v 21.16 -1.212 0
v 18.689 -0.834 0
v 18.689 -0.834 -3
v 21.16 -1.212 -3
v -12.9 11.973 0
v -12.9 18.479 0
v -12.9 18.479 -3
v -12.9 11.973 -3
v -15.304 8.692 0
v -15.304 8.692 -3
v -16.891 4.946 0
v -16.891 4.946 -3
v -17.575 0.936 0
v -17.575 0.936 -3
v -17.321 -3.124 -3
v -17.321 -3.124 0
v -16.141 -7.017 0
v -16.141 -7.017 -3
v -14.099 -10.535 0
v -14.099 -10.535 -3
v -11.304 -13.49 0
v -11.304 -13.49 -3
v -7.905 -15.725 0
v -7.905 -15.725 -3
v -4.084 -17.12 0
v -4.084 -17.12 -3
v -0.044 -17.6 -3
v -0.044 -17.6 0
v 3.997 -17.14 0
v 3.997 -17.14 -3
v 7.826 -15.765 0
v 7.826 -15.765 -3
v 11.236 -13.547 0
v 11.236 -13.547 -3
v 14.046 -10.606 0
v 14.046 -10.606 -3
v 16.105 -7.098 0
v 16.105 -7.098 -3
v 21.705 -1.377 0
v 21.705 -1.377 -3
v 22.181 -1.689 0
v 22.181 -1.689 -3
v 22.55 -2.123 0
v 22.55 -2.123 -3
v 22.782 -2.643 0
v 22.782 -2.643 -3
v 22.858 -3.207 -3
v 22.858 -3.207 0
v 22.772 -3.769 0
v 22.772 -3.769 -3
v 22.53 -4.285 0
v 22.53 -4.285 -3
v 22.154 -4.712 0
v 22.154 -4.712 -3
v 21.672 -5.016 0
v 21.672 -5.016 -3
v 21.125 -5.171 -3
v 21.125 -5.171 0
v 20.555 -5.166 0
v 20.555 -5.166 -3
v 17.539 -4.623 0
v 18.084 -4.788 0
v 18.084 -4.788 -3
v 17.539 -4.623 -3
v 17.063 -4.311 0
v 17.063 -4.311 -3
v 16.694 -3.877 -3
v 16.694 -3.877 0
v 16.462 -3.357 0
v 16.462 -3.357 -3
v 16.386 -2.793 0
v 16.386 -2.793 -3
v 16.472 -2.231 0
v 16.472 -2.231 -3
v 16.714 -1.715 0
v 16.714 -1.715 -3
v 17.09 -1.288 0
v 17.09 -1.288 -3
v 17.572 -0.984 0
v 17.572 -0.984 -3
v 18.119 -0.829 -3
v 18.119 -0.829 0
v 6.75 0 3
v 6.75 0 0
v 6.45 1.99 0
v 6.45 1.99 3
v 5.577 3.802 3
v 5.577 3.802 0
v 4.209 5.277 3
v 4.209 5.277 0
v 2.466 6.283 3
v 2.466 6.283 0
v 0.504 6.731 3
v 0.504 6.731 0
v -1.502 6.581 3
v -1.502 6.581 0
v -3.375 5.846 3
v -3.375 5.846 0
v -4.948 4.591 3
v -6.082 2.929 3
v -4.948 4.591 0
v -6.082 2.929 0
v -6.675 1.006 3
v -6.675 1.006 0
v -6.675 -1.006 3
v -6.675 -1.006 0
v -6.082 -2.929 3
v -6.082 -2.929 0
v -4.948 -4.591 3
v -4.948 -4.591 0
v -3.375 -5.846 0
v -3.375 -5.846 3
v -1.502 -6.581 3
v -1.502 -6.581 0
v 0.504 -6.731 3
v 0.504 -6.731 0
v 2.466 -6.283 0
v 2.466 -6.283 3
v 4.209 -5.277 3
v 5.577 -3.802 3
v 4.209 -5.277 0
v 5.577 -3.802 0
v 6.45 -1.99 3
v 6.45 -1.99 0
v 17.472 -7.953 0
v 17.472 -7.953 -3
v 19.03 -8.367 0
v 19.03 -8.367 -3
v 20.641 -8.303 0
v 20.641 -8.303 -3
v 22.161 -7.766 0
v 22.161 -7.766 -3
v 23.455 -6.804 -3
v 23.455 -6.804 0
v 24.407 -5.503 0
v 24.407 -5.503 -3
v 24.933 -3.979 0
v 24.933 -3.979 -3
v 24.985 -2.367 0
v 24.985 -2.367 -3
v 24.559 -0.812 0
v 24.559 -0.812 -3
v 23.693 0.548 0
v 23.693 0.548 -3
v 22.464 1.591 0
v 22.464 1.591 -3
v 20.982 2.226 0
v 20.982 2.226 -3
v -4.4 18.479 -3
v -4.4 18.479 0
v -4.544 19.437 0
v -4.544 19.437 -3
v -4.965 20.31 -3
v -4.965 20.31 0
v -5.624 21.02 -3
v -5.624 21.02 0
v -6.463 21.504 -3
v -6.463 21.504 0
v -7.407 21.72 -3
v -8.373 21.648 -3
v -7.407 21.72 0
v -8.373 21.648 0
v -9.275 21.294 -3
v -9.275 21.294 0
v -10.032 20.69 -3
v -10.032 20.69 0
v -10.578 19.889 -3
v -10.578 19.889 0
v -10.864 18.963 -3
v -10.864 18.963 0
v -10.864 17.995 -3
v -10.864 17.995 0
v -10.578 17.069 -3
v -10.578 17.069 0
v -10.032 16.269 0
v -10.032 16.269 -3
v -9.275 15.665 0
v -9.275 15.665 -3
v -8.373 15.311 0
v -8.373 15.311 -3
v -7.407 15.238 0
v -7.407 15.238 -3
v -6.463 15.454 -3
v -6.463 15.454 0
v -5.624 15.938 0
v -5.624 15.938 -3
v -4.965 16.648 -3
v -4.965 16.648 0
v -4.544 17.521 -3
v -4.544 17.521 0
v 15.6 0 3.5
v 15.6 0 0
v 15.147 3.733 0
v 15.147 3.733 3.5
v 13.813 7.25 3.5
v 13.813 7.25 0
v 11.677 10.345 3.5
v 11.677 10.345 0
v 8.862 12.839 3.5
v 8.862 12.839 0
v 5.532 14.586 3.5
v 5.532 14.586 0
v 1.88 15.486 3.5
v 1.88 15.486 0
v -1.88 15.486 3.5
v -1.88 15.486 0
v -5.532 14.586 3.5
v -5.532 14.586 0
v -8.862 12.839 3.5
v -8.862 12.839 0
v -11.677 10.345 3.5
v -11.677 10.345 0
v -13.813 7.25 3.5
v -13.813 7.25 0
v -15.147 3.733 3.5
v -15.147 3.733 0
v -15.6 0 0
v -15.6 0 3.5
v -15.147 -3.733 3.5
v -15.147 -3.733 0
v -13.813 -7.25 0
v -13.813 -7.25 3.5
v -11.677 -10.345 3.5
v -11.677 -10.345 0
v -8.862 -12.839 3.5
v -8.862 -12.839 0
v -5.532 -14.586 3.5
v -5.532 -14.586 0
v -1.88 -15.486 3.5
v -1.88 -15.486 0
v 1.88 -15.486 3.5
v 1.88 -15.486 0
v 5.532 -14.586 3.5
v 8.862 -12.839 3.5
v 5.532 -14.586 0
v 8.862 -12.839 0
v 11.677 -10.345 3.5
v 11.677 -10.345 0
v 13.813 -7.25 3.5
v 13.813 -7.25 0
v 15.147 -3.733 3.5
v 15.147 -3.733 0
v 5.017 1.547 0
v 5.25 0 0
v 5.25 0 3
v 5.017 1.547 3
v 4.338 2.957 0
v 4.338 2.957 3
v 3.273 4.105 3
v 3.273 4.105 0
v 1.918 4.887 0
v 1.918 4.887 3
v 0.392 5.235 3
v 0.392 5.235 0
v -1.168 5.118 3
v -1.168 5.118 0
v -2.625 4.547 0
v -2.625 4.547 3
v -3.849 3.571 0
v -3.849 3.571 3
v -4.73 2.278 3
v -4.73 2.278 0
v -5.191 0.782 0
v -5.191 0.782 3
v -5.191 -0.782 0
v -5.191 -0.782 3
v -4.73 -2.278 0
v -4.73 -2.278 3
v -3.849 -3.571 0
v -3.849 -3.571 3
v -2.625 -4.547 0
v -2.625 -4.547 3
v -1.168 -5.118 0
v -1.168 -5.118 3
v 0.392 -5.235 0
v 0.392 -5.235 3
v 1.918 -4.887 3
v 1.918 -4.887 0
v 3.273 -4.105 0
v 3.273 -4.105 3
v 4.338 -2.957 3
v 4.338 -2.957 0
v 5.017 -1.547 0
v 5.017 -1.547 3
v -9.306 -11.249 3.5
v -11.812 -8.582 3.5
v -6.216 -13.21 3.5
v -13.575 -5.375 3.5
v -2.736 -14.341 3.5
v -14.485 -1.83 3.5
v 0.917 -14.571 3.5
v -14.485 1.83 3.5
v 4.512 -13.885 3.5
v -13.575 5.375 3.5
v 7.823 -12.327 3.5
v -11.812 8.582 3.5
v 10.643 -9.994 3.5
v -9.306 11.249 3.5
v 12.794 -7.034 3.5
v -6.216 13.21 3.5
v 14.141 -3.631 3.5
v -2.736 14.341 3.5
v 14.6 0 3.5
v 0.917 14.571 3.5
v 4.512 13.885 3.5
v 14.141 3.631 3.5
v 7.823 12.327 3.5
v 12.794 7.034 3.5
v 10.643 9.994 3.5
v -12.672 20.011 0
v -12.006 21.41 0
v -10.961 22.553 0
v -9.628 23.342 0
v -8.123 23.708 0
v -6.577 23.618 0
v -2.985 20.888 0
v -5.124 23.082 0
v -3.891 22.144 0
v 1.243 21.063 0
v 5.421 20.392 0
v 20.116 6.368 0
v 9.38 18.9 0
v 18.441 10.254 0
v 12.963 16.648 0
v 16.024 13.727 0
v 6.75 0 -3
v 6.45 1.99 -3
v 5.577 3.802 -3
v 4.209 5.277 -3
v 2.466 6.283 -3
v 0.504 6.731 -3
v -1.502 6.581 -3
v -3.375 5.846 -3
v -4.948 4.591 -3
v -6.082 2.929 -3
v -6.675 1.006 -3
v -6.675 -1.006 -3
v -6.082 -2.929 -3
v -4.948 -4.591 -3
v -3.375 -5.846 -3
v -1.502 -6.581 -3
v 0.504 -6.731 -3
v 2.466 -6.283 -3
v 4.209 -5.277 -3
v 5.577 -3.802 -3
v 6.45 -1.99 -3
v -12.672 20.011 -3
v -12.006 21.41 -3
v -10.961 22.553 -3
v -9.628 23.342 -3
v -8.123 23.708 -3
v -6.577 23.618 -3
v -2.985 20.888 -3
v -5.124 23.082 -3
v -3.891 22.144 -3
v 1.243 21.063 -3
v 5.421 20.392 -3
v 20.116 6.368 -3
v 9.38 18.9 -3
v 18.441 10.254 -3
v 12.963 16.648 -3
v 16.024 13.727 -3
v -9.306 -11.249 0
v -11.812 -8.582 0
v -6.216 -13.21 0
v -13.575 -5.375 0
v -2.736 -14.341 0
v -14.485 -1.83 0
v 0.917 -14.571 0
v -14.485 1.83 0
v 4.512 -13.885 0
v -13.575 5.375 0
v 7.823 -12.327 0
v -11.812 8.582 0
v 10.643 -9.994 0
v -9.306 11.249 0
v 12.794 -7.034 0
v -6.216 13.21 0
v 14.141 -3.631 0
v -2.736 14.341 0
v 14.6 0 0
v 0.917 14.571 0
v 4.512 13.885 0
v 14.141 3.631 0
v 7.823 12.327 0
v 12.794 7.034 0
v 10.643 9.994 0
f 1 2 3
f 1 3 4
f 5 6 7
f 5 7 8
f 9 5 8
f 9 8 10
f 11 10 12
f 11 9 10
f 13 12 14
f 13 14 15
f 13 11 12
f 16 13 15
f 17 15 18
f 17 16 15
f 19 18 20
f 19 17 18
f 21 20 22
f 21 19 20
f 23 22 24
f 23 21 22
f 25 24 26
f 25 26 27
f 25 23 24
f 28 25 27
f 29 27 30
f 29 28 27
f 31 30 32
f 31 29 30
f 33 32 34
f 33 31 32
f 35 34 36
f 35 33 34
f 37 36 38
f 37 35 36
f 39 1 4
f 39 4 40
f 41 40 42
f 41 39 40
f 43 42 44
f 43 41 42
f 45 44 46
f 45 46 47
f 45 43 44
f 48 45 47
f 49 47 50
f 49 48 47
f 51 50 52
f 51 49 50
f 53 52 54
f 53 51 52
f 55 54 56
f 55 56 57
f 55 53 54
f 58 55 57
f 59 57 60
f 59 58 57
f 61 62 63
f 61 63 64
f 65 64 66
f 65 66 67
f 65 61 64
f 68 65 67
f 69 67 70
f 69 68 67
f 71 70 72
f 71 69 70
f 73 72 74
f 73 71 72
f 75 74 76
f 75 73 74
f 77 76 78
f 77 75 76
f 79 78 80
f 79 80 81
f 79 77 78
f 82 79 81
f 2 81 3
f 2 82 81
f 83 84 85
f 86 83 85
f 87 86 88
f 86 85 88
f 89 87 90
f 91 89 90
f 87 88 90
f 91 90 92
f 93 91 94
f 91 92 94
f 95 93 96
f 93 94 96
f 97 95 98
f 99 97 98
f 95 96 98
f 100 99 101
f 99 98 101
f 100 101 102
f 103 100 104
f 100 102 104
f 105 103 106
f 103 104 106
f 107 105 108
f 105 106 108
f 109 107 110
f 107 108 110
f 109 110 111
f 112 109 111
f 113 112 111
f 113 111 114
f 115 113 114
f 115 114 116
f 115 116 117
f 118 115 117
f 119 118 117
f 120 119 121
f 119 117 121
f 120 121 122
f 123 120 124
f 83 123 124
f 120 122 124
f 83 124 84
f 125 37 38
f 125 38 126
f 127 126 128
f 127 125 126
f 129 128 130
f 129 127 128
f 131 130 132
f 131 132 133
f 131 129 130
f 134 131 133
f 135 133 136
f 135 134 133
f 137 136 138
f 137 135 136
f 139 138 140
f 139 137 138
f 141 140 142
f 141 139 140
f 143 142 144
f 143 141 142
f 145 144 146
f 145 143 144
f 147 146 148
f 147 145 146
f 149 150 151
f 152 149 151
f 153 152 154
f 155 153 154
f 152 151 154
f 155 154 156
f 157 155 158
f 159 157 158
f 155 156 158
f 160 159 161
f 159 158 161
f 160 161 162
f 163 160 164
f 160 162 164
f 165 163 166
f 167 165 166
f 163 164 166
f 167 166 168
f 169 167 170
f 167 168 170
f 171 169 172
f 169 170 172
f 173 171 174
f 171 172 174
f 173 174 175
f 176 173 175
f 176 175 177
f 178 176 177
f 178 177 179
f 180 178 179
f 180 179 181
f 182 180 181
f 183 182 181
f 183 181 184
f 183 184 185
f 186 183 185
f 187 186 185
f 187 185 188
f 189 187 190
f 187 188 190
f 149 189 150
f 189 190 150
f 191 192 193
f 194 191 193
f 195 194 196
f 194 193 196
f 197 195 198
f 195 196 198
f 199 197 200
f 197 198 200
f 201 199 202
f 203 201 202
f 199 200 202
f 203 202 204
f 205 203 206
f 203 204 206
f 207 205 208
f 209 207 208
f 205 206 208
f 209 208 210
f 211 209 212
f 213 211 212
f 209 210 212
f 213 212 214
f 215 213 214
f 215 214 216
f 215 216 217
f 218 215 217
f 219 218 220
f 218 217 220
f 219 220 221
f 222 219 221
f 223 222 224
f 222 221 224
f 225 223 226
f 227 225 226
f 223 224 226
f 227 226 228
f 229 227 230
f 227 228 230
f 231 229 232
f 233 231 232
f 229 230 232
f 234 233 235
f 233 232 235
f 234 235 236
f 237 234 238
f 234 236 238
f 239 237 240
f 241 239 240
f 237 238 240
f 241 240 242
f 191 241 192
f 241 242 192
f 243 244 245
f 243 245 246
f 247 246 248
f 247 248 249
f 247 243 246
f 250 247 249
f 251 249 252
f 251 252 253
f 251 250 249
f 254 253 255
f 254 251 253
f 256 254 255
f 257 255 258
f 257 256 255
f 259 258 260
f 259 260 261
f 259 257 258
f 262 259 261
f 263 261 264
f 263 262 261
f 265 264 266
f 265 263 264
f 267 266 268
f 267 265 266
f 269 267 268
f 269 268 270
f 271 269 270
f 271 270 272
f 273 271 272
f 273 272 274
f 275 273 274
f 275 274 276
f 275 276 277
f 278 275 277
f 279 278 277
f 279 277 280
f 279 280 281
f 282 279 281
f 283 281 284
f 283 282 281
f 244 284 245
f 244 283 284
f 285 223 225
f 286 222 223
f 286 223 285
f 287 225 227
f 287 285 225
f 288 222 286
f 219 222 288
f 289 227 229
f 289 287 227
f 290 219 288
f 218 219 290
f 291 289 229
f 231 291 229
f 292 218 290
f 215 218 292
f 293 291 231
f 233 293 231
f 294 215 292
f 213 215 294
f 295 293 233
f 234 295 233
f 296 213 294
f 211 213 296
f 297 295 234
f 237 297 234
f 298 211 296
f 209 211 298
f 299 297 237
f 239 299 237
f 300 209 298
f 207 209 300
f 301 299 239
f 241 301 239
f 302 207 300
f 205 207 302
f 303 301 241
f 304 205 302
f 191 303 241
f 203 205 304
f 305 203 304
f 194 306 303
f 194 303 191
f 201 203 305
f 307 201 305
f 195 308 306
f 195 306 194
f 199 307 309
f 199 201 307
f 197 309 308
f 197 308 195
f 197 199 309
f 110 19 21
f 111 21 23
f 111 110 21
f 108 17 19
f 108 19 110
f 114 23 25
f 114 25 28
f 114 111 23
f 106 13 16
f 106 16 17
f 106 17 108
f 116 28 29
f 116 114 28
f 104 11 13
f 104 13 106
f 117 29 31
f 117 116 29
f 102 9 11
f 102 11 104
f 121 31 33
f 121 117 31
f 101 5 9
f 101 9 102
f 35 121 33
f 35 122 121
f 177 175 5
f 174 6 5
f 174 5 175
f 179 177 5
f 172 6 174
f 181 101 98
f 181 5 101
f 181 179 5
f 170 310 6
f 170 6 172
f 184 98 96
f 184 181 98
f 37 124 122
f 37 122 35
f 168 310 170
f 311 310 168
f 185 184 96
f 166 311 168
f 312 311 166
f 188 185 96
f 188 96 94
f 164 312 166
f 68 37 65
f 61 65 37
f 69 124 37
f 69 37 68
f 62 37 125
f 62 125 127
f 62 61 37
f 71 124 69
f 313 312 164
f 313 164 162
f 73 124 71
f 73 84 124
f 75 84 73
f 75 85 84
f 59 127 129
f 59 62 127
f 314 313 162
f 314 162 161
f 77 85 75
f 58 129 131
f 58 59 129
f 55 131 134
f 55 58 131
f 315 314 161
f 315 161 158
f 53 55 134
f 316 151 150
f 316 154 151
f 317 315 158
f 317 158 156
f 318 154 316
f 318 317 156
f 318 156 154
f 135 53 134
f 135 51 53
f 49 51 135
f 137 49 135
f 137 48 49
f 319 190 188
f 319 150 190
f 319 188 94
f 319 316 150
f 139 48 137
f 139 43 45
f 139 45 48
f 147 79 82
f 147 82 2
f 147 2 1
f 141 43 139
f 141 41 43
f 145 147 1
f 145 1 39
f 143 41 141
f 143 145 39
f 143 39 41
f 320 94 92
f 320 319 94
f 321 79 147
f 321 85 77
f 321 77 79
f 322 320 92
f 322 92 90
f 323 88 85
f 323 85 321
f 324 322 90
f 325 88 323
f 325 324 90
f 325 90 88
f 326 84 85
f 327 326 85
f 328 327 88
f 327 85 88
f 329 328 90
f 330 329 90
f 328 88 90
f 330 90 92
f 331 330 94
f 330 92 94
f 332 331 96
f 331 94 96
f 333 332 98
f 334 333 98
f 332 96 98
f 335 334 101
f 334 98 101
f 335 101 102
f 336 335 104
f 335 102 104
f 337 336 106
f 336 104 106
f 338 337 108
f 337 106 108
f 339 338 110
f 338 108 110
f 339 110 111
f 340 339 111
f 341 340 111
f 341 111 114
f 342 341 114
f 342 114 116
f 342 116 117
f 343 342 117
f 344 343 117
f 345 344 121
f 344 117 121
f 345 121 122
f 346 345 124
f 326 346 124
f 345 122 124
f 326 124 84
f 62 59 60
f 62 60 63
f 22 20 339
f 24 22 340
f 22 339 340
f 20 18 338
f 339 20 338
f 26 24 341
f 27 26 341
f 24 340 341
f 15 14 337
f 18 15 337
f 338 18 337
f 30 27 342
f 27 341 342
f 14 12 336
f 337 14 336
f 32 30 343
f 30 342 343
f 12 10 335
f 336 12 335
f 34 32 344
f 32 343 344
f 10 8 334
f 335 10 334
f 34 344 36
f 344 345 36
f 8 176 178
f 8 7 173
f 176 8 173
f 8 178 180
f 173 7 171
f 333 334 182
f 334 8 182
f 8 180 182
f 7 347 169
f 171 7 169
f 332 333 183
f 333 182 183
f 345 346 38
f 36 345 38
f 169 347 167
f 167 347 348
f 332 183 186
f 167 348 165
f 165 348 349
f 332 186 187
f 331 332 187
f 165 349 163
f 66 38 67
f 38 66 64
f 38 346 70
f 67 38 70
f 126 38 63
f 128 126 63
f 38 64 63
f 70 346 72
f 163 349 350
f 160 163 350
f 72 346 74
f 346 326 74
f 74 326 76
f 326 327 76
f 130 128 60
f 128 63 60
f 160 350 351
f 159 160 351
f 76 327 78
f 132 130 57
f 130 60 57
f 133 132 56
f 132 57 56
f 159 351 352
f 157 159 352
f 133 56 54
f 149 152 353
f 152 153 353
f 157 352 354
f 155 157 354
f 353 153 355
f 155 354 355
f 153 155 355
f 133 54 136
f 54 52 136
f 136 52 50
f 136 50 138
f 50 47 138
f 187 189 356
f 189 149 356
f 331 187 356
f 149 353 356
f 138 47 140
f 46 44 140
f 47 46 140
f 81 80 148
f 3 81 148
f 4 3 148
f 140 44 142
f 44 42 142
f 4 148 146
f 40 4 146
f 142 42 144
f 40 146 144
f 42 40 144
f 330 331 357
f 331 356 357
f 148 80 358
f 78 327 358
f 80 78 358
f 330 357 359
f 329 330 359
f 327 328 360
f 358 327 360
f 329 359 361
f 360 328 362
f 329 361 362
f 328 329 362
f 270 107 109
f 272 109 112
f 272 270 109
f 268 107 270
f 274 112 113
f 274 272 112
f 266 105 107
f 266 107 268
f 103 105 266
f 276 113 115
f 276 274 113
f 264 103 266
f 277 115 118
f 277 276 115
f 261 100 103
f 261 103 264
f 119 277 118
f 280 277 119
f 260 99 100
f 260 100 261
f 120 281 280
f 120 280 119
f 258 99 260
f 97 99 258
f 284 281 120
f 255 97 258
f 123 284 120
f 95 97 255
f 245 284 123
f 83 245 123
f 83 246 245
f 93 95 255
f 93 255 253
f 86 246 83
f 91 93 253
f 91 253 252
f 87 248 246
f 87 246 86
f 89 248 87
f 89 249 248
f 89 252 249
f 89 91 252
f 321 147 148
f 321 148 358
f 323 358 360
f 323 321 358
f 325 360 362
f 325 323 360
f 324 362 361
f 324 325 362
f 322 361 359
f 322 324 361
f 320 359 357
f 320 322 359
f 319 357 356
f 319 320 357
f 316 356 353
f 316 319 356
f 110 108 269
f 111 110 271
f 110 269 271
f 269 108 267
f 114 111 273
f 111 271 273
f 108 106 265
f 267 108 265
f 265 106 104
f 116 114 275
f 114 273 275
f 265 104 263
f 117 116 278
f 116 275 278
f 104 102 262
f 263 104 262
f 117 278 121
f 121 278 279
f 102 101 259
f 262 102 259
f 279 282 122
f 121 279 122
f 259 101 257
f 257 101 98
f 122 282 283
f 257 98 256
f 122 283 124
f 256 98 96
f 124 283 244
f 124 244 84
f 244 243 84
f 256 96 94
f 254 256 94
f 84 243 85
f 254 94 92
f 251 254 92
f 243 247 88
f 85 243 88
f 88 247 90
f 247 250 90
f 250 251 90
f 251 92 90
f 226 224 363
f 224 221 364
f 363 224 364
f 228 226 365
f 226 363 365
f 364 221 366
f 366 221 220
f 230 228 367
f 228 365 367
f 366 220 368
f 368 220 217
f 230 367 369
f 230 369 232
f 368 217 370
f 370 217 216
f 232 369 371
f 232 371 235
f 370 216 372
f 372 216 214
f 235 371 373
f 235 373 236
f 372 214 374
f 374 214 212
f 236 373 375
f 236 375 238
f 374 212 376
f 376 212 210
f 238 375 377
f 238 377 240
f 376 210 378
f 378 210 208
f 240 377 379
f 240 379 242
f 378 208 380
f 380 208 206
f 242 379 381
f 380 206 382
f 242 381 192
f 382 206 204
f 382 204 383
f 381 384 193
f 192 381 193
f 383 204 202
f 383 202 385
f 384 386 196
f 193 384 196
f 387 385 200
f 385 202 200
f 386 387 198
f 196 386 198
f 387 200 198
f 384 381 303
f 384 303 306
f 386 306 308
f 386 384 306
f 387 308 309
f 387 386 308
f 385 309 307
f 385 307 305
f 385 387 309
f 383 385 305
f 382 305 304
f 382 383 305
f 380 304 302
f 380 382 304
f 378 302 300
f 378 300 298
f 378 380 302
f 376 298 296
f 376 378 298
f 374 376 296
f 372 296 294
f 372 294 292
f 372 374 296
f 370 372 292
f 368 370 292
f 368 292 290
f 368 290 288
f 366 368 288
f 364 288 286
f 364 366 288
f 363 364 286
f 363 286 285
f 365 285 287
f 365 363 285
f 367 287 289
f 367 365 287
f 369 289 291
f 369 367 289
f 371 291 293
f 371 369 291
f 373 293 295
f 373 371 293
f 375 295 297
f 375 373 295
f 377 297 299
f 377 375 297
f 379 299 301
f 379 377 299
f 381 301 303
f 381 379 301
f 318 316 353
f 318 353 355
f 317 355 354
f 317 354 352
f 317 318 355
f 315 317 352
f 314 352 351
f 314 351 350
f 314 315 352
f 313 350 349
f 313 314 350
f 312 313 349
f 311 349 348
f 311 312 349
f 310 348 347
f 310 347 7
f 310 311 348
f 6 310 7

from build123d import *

# Parameters (mm, degrees)
SKETCH_1_R      = 14.6
EXTRUDE_1_DEPTH = 3.5
SKETCH_1_4_R    = 6.75
SKETCH_1_4_R_2  = 5.25
EXTRUDE_2_DEPTH = 3
SKETCH_1_5_R    = 3.25
SKETCH_1_5_R_2  = 6.75
EXTRUDE_3_DEPTH = 3


with BuildPart() as part:
    # Эскиз1 → Бобышка-Вытянуть1 (new body)
    with BuildSketch(Plane.XY):
        with BuildLine():
            ThreePointArc((15.6, 0), (4.589117562, 14.909728368), (-12.9, 8.77211491))
            ThreePointArc((-12.9, 8.77211491), (-7.054522331, -13.91379584), (14.700159992, -5.221618161))
            ThreePointArc((14.700159992, -5.221618161), (15.373394158, -2.649292748), (15.6, 0))
        make_face()
        Circle(SKETCH_1_R, mode=Mode.SUBTRACT)
    extrude(amount=EXTRUDE_1_DEPTH)


with BuildPart() as body_2:
    # Эскиз1<4> → Бобышка-Вытянуть2 (new body)
    with BuildSketch(Plane.XY):
        Circle(SKETCH_1_4_R)
        Circle(SKETCH_1_4_R_2, mode=Mode.SUBTRACT)
    extrude(amount=EXTRUDE_2_DEPTH)


with BuildPart() as body_3:
    # Эскиз1<5> → Бобышка-Вытянуть3 (new body)
    with BuildSketch(Plane.XY):
        with BuildLine():
            ThreePointArc((-12.9, 11.972886035), (-9.669131149, -14.706049872), (16.105276229, -7.097892475))
            ThreePointArc((16.105276229, -7.097892475), (24.406931227, -5.50286626), (20.982267102, 2.225863258))
            ThreePointArc((20.982267102, 2.225863258), (12.963054137, 16.648400146), (-2.985146295, 20.887769187))
            ThreePointArc((-2.985146295, 20.887769187), (-8.889358312, 23.580726333), (-12.9, 18.479109827))
            Line((-12.9, 18.479109827), (-12.9, 11.972886035))
        make_face()
        with Locations((-7.65, 18.479109827)):
            Circle(SKETCH_1_5_R, mode=Mode.SUBTRACT)
        with BuildLine():
            Line((18.688615516, -0.834056402), (21.159898919, -1.211890155))
            ThreePointArc((21.159898919, -1.211890155), (22.834658638, -3.491183879), (20.555364914, -5.165943598))
            Line((20.555364914, -5.165943598), (18.084081511, -4.788109845))
            ThreePointArc((18.084081511, -4.788109845), (16.409321792, -2.508816121), (18.688615516, -0.834056402))
        make_face(mode=Mode.SUBTRACT)
        Circle(SKETCH_1_5_R_2, mode=Mode.SUBTRACT)
    extrude(amount=-EXTRUDE_3_DEPTH)


solid = Compound([part.part, body_2.part, body_3.part])
